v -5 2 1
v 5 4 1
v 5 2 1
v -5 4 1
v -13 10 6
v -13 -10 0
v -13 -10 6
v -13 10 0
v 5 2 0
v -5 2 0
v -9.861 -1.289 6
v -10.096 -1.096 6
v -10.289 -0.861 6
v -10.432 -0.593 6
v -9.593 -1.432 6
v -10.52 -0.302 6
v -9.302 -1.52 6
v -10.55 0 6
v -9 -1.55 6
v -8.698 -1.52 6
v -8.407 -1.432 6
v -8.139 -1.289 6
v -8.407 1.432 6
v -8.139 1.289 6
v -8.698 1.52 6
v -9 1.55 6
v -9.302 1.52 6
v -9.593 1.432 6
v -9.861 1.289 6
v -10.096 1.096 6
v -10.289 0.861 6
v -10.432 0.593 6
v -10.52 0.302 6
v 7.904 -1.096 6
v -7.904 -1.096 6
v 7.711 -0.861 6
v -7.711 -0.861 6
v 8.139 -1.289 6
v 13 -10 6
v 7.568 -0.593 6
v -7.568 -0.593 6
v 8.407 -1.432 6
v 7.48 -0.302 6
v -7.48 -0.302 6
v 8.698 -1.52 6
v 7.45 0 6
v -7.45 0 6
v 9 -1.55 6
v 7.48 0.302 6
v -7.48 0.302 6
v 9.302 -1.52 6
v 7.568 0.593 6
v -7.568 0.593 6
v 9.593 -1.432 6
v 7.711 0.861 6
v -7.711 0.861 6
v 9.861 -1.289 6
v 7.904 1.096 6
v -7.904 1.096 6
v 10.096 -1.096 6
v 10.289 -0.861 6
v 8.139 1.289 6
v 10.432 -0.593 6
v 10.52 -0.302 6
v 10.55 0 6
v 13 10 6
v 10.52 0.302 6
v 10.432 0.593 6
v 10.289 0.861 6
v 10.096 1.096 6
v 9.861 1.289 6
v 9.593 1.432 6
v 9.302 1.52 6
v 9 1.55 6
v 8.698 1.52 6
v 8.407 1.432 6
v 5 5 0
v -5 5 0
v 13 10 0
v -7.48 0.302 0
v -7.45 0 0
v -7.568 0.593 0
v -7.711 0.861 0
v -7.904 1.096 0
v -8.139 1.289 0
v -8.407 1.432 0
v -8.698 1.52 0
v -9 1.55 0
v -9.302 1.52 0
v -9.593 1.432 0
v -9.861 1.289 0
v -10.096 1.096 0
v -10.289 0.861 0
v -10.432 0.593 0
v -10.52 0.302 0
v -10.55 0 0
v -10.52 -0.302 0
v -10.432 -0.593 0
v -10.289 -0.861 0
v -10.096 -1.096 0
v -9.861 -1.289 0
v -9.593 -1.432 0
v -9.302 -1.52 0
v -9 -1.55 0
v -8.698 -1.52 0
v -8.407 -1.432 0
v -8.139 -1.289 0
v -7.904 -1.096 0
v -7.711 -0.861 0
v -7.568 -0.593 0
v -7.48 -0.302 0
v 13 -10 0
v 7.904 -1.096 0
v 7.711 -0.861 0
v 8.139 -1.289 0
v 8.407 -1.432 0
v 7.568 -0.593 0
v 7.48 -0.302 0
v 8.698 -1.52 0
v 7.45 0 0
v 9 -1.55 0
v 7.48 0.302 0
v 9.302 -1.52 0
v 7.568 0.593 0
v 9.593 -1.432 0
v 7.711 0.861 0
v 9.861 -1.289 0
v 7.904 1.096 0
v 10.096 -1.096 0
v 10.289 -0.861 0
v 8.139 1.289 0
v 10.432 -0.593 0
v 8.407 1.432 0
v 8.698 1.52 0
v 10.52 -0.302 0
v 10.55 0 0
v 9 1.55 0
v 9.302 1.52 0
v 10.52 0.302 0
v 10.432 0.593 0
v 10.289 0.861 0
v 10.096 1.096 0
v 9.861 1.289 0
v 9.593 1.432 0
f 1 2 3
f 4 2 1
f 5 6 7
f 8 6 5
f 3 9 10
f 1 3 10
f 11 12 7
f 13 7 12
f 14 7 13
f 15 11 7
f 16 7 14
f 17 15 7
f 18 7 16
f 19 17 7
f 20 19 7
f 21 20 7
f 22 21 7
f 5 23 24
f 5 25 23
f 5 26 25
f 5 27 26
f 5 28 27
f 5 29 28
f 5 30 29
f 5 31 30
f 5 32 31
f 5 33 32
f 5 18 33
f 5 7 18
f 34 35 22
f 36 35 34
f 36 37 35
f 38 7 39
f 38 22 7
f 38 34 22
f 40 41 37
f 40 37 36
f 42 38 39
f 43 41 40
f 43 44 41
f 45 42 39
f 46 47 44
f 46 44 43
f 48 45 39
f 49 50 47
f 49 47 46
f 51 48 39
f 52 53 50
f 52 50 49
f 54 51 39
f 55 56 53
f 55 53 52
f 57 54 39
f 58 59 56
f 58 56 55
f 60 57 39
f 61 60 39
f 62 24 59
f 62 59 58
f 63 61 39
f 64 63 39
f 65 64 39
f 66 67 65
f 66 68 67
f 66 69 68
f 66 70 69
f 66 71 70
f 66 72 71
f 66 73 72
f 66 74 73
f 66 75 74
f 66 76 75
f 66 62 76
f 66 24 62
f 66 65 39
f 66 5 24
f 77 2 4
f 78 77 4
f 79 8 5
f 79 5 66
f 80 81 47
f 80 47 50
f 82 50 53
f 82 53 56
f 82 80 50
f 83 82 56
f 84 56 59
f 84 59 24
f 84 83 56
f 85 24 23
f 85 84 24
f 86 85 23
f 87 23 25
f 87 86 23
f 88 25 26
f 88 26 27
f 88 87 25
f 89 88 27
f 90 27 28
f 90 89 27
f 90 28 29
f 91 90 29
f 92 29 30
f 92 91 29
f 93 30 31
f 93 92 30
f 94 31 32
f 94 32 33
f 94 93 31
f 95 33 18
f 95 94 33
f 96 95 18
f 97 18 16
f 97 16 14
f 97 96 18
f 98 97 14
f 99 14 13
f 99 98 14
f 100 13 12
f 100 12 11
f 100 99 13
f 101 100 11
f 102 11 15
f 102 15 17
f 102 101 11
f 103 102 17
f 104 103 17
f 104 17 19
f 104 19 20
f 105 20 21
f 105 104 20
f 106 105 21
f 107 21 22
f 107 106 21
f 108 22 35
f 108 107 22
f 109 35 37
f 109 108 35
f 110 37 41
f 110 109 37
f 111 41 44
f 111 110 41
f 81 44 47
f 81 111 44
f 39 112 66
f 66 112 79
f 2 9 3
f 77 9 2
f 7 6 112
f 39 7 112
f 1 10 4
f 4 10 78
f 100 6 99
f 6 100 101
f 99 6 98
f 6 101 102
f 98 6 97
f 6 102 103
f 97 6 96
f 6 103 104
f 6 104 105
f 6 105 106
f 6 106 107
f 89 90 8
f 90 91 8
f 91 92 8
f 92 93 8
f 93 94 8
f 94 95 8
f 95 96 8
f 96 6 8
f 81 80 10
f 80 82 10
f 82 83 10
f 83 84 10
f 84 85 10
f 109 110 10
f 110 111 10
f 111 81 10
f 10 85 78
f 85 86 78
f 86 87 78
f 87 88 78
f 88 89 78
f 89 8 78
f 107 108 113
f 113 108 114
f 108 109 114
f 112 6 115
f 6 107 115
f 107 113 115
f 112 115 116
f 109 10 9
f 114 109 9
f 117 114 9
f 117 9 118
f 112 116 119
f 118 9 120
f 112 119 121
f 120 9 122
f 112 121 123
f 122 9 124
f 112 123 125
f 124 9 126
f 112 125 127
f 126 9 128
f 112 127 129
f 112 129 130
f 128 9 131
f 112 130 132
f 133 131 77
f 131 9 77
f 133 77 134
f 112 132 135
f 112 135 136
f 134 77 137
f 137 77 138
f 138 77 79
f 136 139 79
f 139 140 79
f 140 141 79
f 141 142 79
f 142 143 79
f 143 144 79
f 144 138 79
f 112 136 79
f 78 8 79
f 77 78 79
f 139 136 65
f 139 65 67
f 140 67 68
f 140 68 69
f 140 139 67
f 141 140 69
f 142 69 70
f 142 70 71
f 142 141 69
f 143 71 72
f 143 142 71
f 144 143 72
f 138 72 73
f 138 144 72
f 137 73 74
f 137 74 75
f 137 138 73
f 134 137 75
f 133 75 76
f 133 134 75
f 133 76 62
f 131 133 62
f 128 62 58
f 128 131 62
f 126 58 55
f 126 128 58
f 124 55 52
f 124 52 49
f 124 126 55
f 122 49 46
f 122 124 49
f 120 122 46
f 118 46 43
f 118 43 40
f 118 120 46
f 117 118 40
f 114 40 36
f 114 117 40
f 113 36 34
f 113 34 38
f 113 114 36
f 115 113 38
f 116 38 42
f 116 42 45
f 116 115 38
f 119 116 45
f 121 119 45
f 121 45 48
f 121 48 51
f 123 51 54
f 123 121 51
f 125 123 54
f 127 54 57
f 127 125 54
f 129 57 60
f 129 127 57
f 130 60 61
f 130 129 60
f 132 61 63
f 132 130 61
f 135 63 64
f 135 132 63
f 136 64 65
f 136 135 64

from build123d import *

# Parameters (mm, degrees)
SKETCH1_W           = 26
SKETCH1_H           = 20
SKETCH1_R           = 1.55
BOSS_EXTRUDE1_DEPTH = 6
SKETCH4_W           = 10
SKETCH4_H           = 2
CUT_EXTRUDE3_DEPTH  = 1
CHAMFER1_SIZE       = 1


with BuildPart() as part:
    # Sketch1 → Boss-Extrude1 (new body)
    with BuildSketch(Plane.XY):
        Rectangle(SKETCH1_W, SKETCH1_H)
        with Locations((9, 0)):
            Circle(SKETCH1_R, mode=Mode.SUBTRACT)
        with Locations((-9, 0)):
            Circle(SKETCH1_R, mode=Mode.SUBTRACT)
    extrude(amount=BOSS_EXTRUDE1_DEPTH)

    # Sketch4 → Cut-Extrude3 (cut)
    with BuildSketch(Plane(origin=(0, 0, 0), x_dir=(-1, 0, 0), z_dir=(0, 0, -1))):
        with Locations((0, 3)):
            Rectangle(SKETCH4_W, SKETCH4_H)
    extrude(amount=-CUT_EXTRUDE3_DEPTH, mode=Mode.SUBTRACT)

    # Chamfer1
    chamfer1_edges = [part.edges().sort_by_distance(p)[0] for p in [
        (0, 4, 0),
    ]]
    chamfer(chamfer1_edges, length=CHAMFER1_SIZE - 0.0001)  # a hair under: the kernel refuses the full size


solid = part.part
